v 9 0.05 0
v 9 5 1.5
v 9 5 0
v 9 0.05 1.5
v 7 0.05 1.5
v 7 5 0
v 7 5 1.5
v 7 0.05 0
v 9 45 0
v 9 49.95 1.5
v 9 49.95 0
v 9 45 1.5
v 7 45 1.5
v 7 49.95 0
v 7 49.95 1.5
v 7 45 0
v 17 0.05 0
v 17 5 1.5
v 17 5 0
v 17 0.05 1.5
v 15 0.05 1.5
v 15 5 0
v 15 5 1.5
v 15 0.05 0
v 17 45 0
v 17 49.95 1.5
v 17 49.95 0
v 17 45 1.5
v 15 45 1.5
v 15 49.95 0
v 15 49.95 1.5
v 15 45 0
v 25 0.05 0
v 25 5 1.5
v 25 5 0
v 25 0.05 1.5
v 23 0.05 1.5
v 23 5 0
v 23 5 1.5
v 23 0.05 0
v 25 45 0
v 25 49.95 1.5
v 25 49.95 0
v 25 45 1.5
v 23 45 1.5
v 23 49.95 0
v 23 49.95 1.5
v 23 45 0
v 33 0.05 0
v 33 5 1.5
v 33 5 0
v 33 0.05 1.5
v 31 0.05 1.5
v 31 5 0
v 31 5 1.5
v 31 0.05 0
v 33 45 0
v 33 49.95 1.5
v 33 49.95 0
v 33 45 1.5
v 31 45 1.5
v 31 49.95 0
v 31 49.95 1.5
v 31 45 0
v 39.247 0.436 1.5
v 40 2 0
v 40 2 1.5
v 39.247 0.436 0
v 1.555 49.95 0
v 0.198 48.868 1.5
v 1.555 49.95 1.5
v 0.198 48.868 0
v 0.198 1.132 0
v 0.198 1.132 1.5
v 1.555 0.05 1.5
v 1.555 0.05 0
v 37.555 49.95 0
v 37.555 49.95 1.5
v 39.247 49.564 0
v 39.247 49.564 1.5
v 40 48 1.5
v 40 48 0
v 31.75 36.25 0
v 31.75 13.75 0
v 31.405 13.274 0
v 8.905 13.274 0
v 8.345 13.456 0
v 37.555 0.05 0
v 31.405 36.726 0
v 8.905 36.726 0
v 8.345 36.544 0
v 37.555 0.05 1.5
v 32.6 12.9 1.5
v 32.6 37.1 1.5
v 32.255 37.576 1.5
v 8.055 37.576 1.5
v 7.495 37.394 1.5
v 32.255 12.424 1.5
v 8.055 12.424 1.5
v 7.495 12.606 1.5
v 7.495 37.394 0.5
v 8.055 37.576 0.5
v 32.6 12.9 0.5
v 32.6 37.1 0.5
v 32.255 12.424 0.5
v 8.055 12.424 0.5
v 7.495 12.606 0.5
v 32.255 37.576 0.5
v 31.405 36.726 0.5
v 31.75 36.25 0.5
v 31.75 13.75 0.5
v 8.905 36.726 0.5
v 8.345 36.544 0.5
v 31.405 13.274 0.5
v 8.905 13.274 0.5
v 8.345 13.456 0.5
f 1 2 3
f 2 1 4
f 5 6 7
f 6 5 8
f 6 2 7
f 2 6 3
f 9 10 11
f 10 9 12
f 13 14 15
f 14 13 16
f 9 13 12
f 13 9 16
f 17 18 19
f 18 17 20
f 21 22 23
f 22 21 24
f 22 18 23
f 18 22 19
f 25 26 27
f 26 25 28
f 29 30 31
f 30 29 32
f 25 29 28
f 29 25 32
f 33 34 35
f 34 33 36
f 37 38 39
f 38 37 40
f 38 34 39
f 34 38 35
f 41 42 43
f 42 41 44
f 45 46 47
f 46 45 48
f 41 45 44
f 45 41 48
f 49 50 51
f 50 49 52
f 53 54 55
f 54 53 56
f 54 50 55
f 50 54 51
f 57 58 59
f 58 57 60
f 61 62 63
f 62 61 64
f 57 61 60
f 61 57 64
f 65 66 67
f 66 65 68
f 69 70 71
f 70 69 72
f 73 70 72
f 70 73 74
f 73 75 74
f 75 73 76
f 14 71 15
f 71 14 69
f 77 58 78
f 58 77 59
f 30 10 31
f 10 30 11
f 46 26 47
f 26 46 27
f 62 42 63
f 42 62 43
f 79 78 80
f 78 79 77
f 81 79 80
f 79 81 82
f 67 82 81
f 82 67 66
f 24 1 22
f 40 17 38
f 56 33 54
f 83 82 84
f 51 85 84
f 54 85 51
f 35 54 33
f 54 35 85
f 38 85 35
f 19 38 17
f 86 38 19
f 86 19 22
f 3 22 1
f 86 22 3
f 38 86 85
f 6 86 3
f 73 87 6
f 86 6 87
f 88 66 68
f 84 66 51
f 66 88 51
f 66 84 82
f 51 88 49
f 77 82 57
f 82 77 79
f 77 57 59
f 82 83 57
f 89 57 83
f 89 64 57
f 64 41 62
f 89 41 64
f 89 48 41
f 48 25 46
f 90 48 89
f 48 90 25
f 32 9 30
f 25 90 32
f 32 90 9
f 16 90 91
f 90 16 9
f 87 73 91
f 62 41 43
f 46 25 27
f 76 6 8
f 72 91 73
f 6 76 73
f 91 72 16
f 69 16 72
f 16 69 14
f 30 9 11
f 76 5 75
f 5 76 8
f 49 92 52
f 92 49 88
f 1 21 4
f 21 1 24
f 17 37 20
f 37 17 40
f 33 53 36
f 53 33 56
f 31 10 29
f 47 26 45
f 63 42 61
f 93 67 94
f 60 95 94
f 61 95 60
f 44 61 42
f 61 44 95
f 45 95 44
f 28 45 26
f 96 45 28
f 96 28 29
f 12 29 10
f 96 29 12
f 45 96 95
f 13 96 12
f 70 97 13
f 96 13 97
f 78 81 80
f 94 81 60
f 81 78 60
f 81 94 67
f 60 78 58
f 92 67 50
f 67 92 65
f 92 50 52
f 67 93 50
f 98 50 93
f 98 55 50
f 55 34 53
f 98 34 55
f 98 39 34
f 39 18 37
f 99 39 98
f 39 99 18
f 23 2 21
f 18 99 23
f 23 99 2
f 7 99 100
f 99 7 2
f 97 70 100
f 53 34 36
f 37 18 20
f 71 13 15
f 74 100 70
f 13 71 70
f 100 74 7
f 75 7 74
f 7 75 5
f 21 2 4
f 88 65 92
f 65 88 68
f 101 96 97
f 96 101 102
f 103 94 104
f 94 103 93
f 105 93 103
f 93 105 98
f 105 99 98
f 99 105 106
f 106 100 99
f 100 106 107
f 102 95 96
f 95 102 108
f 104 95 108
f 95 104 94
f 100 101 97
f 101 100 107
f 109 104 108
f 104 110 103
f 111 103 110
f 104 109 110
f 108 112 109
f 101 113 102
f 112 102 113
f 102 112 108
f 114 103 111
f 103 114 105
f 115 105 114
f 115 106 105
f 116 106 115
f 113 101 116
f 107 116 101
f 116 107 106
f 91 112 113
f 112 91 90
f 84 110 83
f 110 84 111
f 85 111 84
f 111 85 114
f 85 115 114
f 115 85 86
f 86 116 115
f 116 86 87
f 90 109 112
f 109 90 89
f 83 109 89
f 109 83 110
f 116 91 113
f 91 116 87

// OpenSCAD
/* [Flange] */
flange_x = 40;
flange_y = 50;
flange_z = 1.5;
flange_radius = 2;

/* [Recess] */
// These should match the core outside dimensions from ei_bobbin.scad
recess_x = 25;        // core_inside_x + 2*core_wall
recess_y = 25;        // core_inside_y + 2*core_wall
recess_depth = 1;     // How deep the core slots into the cap
recess_clearance = 0.2;  // Extra clearance for fit
recess_radius = 0.5;

/* [Hole] */
// These should match the core inside dimensions from ei_bobbin.scad
hole_x = 23.5;
hole_y = 23.5;
hole_radius = 0.5;

/* [Notches] */
notch_count = 4;
notch_width = 2;
notch_depth = 5;  // How far the notch cuts into the flange from the edge

module roundedcube(xdim, ydim, zdim, rdim){
    hull(){
        translate([rdim,rdim,0])cylinder(h=zdim,r=rdim);
        translate([xdim-rdim,rdim,0])cylinder(h=zdim,r=rdim);
        translate([rdim,ydim-rdim,0])cylinder(h=zdim,r=rdim);
        translate([xdim-rdim,ydim-rdim,0])cylinder(h=zdim,r=rdim);
    }
}

module mirror_copy(v) {
    children();
    mirror(v) children();
}

module notches() {
    step = flange_x / (notch_count + 1);
    for (x = [step : step : flange_x - step]) {
        // Front edge (Y=0) - notch cuts inward from outside
        translate([x - notch_width/2, -1, -0.01])
            cube([notch_width, notch_depth + 1, flange_z + 0.02]);
        // Back edge (Y=flange_y) - notch cuts inward from outside
        translate([x - notch_width/2, flange_y - notch_depth, -0.01])
            cube([notch_width, notch_depth + 1, flange_z + 0.02]);
    }
}

// Calculate recess dimensions with clearance
recess_actual_x = recess_x + recess_clearance;
recess_actual_y = recess_y + recess_clearance;

// Calculate recess position (centered on flange)
recess_offset_x = (flange_x - recess_actual_x) / 2;
recess_offset_y = (flange_y - recess_actual_y) / 2;

// Calculate hole position (centered on flange)
hole_offset_x = (flange_x - hole_x) / 2;
hole_offset_y = (flange_y - hole_y) / 2;

difference(){
    roundedcube(flange_x, flange_y, flange_z, flange_radius);
    // Recess for core area to slot into
    translate([recess_offset_x, recess_offset_y, flange_z - recess_depth])
        roundedcube(recess_actual_x, recess_actual_y, recess_depth + 1, recess_radius);
    // Center hole (matches core inside dimensions)
    translate([hole_offset_x, hole_offset_y, -1])
        roundedcube(hole_x, hole_y, flange_z + 2, hole_radius);
    // Flange notches on front/back (Y-axis edges)
    notches();
}
